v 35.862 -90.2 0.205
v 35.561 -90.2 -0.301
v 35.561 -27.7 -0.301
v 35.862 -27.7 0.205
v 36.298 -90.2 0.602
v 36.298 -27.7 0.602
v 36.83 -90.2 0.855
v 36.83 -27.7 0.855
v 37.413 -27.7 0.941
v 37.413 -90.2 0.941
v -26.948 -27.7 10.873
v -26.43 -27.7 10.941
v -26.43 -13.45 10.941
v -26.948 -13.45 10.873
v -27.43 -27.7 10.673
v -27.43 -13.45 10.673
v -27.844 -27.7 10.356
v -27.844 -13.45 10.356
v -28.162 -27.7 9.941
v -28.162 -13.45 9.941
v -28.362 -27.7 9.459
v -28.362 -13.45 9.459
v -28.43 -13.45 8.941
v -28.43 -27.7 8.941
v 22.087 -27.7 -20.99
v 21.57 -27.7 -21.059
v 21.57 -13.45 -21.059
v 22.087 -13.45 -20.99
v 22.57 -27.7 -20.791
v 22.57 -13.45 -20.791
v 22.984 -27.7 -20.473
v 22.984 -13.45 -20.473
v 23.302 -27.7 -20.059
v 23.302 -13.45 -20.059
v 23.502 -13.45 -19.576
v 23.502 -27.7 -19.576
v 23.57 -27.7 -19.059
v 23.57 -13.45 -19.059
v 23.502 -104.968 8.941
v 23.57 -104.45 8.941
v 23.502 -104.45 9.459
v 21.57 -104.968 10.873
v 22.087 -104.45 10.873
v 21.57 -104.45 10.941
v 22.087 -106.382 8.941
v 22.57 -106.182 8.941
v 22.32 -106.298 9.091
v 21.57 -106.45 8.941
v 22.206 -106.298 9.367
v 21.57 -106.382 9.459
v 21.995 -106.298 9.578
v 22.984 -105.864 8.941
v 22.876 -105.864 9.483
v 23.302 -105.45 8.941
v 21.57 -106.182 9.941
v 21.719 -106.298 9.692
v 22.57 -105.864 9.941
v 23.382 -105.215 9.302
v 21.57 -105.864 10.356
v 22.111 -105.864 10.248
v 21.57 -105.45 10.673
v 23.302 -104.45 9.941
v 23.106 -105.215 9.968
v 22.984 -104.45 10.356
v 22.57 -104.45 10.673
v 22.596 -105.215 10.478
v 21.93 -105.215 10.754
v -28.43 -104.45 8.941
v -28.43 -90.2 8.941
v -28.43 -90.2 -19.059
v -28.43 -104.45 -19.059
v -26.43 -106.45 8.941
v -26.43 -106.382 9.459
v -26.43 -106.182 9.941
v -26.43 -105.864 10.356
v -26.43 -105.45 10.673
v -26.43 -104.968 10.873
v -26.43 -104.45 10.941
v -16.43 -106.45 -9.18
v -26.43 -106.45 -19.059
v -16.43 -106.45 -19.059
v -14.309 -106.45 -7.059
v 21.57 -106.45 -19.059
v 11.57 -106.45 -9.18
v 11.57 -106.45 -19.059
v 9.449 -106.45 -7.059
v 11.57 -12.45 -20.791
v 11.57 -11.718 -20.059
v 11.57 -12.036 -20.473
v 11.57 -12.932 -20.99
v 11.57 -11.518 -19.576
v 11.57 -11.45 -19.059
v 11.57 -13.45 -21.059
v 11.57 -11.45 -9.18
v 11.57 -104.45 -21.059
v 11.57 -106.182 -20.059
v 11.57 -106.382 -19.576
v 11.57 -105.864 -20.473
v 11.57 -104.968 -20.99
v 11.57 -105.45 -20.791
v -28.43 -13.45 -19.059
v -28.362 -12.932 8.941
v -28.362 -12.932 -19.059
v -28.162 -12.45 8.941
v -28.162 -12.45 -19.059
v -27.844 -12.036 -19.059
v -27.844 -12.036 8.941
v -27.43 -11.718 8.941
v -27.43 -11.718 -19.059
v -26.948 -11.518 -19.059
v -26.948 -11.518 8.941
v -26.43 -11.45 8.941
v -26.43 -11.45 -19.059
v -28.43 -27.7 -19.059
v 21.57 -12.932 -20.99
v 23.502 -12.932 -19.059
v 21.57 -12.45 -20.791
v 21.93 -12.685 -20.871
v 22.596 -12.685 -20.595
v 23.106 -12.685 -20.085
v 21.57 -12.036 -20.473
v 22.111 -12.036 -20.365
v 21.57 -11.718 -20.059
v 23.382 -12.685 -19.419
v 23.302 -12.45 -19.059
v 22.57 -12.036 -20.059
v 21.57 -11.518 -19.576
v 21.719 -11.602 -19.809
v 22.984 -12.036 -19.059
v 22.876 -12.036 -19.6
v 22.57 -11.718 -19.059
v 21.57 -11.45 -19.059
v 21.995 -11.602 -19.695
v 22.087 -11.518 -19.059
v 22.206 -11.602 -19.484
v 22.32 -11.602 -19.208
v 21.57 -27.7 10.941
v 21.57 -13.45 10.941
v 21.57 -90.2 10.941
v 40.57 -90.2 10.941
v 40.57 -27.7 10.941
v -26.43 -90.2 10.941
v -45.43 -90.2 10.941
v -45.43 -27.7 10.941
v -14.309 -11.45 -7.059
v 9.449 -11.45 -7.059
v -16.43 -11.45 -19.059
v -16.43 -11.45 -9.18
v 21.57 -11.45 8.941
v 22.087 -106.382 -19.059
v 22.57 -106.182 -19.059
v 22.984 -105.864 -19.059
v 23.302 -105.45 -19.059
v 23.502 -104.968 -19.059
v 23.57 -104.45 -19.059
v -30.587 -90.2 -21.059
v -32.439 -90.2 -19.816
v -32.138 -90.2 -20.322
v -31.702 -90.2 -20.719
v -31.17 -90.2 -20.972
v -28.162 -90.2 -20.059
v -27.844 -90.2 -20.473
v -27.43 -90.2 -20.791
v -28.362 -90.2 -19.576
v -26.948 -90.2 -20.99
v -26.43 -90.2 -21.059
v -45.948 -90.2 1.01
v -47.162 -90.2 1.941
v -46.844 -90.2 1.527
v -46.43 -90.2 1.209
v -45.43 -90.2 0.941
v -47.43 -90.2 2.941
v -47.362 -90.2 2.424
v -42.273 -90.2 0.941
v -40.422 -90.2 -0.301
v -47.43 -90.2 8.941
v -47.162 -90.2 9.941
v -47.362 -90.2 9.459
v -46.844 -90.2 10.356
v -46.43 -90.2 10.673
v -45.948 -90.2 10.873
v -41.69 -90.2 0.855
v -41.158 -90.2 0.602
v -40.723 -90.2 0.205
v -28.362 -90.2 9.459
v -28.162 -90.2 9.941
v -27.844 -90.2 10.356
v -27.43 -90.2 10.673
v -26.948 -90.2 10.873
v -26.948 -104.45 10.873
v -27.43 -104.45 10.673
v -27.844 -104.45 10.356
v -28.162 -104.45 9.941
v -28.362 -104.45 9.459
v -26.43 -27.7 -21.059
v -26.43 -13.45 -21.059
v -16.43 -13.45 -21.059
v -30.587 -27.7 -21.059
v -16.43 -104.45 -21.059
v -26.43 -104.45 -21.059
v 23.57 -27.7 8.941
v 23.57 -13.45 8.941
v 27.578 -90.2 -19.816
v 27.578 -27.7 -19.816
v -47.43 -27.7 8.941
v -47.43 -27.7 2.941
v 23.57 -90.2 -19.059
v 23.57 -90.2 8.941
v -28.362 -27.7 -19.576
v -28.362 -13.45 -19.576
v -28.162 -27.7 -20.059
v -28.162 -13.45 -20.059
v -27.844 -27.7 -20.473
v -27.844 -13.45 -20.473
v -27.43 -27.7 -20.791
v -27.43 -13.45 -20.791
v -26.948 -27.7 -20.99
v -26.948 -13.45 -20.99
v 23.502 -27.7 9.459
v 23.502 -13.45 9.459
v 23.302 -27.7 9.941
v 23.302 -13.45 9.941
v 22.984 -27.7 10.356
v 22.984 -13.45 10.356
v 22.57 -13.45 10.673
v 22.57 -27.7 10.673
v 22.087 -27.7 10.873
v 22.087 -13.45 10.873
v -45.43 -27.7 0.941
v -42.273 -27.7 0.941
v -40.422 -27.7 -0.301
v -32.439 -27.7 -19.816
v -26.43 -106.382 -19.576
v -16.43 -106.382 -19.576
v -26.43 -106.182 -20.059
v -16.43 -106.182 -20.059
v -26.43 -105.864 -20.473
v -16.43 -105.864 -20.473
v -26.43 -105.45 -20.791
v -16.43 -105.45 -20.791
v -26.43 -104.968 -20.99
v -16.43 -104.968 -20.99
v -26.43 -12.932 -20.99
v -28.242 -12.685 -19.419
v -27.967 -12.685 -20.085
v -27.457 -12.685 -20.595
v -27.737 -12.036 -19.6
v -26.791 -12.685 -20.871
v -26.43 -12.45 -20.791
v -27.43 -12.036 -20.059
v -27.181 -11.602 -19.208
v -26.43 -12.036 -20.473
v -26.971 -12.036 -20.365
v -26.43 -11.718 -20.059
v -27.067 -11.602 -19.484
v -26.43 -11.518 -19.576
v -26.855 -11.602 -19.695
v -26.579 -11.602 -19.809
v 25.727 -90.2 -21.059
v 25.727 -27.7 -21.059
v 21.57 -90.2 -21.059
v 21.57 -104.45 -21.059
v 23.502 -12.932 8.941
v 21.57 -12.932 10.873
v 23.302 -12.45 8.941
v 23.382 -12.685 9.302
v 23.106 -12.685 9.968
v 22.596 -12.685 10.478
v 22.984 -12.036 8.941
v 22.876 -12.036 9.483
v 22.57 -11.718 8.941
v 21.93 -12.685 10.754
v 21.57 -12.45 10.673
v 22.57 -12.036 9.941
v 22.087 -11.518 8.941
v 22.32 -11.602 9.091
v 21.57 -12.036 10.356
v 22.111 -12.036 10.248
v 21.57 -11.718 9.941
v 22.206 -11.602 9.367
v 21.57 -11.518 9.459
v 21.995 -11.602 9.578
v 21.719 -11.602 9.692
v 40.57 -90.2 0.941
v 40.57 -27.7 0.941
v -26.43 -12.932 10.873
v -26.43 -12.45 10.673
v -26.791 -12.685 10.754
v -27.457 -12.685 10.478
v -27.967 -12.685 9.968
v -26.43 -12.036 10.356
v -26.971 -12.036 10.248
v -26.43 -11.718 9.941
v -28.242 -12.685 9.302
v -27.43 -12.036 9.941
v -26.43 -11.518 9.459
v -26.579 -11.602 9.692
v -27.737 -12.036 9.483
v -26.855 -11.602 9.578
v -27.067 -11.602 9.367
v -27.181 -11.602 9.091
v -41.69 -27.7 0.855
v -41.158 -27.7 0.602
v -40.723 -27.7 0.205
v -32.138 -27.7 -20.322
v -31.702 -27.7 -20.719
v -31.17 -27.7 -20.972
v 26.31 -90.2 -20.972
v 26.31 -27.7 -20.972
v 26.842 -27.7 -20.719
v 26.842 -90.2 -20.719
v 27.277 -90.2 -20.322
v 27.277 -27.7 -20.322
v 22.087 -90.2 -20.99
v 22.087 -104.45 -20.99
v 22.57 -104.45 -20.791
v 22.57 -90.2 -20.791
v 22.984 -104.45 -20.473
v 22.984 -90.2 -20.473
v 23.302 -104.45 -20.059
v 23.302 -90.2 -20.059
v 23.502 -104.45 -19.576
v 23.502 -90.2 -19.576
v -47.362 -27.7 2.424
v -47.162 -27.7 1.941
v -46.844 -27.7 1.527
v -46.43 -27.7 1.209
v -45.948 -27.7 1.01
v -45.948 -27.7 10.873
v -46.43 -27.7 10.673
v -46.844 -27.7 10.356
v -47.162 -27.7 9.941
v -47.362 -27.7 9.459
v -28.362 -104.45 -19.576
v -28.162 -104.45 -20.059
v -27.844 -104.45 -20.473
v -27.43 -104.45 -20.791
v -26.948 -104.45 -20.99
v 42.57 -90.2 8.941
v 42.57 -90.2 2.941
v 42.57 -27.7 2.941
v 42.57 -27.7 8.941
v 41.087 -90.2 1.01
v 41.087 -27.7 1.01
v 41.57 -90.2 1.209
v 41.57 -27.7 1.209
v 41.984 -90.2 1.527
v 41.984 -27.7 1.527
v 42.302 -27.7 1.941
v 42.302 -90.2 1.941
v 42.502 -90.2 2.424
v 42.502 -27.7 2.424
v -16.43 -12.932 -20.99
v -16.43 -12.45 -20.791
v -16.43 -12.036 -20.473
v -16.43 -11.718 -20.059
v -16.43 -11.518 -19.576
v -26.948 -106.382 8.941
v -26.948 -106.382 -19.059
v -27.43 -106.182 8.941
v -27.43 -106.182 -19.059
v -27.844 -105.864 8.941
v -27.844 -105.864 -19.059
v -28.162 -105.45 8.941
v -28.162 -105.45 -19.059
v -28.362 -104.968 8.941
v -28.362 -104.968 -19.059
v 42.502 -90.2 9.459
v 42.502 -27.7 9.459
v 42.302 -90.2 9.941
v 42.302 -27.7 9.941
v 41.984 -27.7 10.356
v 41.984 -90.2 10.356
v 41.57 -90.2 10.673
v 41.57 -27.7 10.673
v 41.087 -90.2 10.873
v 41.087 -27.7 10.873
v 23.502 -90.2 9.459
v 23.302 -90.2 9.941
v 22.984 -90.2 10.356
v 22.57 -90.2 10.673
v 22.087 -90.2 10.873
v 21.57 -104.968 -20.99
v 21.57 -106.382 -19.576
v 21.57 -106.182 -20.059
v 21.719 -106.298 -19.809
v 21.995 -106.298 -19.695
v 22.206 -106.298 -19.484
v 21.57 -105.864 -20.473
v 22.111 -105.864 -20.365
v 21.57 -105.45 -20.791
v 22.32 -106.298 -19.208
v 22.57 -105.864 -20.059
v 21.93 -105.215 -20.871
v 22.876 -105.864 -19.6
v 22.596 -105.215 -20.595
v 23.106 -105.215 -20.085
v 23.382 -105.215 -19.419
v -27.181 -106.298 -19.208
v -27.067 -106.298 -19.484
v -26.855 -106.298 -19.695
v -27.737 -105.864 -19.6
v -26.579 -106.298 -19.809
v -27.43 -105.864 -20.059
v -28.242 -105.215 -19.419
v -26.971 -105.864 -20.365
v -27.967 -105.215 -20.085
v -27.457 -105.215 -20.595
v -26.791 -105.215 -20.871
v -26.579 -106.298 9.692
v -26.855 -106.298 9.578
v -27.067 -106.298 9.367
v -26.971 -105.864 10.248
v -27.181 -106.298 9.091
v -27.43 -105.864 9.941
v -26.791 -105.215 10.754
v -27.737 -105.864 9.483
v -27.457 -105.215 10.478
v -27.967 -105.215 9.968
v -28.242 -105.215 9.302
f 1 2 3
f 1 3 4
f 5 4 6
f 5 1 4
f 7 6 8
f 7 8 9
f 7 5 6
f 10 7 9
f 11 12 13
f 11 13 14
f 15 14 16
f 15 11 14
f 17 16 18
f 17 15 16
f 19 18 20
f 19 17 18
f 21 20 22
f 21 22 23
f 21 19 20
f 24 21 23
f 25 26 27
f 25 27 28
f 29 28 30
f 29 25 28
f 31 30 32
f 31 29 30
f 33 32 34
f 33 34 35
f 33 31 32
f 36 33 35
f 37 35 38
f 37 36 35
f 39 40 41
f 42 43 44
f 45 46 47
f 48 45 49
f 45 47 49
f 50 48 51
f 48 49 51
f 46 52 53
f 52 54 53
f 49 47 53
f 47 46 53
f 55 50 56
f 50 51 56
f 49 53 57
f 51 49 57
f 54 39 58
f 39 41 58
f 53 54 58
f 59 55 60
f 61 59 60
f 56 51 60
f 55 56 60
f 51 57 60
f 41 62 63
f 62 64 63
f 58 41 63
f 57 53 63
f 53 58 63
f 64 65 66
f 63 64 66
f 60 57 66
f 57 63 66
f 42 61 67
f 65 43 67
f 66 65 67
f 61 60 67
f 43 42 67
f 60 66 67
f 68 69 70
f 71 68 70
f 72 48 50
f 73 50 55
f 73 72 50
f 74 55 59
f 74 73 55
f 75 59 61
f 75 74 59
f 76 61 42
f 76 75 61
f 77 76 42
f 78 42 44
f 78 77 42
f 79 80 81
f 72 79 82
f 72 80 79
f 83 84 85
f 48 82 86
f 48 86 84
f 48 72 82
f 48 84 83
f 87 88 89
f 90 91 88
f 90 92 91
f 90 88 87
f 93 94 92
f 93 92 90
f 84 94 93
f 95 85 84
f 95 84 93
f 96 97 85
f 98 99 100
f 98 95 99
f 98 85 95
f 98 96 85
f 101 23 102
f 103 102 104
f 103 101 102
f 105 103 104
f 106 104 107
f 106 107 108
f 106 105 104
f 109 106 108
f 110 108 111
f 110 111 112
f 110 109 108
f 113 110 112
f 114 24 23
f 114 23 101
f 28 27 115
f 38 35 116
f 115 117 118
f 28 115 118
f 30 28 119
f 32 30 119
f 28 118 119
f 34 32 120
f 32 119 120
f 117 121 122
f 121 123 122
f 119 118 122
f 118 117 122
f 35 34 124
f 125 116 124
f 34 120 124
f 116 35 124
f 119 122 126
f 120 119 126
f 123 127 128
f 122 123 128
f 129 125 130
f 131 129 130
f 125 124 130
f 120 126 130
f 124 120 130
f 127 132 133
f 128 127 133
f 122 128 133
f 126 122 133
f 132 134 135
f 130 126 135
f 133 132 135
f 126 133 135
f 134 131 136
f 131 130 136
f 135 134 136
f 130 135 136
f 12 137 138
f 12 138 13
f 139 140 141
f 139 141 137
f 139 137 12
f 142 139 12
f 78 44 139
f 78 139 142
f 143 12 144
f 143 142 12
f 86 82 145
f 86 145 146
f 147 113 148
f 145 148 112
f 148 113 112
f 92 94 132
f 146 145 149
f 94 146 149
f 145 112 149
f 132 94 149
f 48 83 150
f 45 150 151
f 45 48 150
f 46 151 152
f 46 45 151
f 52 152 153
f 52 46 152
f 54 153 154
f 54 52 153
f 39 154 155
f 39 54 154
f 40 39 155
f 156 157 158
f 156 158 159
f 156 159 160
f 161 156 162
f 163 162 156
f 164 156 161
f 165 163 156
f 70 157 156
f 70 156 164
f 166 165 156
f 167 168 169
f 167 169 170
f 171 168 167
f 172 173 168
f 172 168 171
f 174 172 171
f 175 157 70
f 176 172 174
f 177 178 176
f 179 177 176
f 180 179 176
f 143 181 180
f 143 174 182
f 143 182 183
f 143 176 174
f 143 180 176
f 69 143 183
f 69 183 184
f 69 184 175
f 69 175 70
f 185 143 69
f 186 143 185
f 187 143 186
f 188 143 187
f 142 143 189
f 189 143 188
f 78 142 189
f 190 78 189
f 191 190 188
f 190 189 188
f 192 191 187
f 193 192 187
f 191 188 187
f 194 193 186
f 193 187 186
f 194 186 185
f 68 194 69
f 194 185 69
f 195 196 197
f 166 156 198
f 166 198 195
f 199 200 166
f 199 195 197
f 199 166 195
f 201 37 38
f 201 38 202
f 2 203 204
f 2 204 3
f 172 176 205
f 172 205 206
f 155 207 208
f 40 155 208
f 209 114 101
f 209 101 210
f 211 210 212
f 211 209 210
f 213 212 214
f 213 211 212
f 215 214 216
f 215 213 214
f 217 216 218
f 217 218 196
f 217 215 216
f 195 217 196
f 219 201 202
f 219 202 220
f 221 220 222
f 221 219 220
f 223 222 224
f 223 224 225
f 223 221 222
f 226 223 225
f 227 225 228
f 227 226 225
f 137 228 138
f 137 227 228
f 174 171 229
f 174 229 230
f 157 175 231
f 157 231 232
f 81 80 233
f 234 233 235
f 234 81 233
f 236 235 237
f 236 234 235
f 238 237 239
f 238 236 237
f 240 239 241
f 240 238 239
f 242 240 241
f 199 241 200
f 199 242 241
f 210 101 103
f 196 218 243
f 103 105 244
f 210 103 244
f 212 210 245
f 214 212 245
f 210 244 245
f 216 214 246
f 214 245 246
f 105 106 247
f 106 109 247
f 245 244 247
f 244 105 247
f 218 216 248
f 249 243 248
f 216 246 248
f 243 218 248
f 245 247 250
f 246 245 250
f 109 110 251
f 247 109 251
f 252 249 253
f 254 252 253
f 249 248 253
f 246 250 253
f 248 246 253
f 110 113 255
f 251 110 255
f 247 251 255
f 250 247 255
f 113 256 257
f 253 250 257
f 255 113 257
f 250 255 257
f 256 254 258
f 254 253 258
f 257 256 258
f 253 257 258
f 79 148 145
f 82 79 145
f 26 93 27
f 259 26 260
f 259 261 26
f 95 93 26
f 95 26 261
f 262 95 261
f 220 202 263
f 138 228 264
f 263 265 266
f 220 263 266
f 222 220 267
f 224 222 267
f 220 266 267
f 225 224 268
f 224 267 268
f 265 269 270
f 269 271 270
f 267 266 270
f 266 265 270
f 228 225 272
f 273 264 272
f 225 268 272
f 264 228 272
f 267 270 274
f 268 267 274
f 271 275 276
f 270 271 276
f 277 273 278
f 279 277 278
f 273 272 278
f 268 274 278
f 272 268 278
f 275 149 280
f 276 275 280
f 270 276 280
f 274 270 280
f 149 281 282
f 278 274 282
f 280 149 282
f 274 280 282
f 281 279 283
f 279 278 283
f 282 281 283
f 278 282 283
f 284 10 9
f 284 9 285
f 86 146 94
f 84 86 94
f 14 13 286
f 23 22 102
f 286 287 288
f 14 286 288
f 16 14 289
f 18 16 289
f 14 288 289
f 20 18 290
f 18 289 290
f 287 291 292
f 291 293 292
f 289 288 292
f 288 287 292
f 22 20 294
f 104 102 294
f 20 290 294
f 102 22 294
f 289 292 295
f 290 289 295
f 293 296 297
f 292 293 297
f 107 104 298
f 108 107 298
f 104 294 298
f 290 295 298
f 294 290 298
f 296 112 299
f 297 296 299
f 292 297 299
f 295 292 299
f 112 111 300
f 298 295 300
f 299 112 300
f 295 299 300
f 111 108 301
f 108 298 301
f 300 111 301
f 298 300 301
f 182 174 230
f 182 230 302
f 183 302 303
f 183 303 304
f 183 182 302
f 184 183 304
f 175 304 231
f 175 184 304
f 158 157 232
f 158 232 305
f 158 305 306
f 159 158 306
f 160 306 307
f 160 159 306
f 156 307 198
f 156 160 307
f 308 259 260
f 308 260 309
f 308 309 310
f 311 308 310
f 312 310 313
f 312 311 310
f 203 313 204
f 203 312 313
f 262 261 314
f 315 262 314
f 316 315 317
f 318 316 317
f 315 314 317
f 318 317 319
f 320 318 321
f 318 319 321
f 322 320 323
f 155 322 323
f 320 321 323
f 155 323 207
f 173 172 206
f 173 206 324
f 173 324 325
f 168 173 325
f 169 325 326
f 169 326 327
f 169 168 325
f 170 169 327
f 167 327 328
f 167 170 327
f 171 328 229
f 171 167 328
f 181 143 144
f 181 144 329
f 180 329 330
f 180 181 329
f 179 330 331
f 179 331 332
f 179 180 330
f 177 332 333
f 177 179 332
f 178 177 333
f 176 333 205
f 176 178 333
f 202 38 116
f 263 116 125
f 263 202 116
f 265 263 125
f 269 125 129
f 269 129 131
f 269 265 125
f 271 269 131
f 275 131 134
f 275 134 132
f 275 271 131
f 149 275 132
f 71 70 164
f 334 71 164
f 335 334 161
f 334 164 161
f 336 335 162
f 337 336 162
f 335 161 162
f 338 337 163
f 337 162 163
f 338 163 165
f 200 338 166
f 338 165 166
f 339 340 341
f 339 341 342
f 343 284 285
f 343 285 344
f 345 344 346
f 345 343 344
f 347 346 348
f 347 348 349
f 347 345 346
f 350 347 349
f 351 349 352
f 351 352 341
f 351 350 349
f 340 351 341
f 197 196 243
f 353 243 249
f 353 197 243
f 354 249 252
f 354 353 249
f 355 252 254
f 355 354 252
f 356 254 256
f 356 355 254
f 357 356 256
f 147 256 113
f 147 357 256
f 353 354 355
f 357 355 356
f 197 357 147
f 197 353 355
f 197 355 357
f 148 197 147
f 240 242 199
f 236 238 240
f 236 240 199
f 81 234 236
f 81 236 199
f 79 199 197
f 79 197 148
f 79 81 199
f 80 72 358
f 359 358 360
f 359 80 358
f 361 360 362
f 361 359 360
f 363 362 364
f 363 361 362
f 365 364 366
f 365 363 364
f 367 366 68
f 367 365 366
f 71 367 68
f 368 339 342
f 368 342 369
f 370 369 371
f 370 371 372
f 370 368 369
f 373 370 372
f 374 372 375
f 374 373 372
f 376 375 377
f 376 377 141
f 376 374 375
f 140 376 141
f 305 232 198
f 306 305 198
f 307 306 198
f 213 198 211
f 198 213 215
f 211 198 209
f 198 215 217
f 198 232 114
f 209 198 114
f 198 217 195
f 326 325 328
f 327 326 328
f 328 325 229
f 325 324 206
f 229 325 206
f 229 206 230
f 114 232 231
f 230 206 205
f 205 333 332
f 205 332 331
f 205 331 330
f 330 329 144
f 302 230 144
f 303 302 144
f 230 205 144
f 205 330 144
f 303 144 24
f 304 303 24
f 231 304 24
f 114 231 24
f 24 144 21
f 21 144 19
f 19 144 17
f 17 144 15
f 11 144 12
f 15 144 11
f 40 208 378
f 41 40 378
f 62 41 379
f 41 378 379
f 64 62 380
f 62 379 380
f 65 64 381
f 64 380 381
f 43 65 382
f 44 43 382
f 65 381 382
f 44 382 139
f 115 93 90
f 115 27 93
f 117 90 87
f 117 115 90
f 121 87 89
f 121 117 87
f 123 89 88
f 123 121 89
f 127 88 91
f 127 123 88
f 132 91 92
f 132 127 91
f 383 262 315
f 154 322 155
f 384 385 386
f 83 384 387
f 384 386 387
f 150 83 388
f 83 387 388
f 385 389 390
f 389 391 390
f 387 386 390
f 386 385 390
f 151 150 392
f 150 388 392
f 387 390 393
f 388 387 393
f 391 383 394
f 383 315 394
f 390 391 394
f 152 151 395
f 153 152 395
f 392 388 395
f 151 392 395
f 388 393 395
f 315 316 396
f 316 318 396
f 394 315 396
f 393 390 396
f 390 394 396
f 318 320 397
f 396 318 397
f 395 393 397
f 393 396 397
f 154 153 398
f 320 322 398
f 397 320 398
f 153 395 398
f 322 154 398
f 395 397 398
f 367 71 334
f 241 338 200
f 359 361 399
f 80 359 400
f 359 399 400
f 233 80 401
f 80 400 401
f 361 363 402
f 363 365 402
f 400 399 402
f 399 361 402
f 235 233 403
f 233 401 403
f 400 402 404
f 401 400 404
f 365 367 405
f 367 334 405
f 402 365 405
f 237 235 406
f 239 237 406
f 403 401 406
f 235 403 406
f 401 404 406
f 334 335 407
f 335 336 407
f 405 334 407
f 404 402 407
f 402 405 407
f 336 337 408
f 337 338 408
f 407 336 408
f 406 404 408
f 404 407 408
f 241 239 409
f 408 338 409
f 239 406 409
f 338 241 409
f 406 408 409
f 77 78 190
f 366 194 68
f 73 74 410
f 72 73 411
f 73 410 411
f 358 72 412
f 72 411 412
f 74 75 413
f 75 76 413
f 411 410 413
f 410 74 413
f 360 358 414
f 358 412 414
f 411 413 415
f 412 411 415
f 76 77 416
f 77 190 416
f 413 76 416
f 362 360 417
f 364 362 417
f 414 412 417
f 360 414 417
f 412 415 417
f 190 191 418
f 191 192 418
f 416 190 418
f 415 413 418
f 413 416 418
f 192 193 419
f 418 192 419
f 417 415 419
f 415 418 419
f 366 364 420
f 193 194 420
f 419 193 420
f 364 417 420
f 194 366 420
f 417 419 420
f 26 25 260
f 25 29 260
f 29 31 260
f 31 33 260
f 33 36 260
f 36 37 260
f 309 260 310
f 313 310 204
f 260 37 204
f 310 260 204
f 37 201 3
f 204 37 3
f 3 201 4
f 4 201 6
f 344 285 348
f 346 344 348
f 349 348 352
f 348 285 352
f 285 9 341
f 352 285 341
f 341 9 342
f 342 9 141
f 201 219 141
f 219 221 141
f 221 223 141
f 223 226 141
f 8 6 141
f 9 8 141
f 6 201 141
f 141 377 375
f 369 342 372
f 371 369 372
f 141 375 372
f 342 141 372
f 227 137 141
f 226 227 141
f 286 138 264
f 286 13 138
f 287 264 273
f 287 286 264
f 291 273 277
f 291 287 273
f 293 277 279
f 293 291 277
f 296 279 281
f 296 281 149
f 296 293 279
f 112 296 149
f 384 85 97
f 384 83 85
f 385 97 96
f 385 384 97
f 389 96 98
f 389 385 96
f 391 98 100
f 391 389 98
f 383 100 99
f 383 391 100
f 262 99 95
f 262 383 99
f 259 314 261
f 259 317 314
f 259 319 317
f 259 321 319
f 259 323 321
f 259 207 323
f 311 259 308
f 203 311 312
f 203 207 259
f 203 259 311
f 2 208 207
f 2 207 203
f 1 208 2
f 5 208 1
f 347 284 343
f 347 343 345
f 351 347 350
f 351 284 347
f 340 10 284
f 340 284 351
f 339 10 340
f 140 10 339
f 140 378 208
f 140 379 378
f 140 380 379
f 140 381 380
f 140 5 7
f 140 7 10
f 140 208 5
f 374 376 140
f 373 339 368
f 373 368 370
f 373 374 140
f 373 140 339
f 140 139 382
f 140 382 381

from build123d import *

# Parameters (mm, degrees)
F0_W          = 90
F0_H          = 32
F1_DEPTH      = 65.2
F3_DEPTH      = 25
F4_W          = 90
F4_H          = 65.2
F5_DEPTH      = 32.001
F6_DEPTH      = 62.5
F8_DEPTH      = 16.25
F8_DEPTH_BACK = 78.75
F9_R          = 2
F11_DEPTH     = 78.751


with BuildPart() as f1:
    # F0 (on Front) → F1 (new body)
    with BuildSketch(Plane.XZ):
        with Locations((-2.4301670492, -5.0586230417)):
            Rectangle(F0_W, F0_H)
    extrude(amount=F1_DEPTH)

    # F2 (on face) → F3 (join)
    with BuildSketch(Plane.XZ.offset(65.2)):
        with BuildLine():
            Line((40.5698329508, 10.9413769583), (-45.4301670492, 10.9413769583))
            ThreePointArc((-45.4301670492, 10.9413769583), (-46.8443806115, 10.3555905207), (-47.4301670492, 8.9413769583))
            Line((-47.4301670492, 8.9413769583), (-47.4301670492, 2.9413769583))
            ThreePointArc((-47.4301670492, 2.9413769583), (-46.8443806115, 1.5271633959), (-45.4301670492, 0.9413769583))
            Line((-45.4301670492, 0.9413769583), (-42.2728696535, 0.9413769583))
            ThreePointArc((-42.2728696535, 0.9413769583), (-41.1580897163, 0.6018785968), (-40.4217757411, -0.3013573503))
            Line((-40.4217757411, -0.3013573503), (-32.4385583572, -19.8158887331))
            ThreePointArc((-32.4385583572, -19.8158887331), (-31.7022443821, -20.7191246802), (-30.5874644448, -21.0586230417))
            Line((-30.5874644448, -21.0586230417), (25.7271303465, -21.0586230417))
            ThreePointArc((25.7271303465, -21.0586230417), (26.8419102837, -20.7191246802), (27.5782242589, -19.8158887331))
            Line((27.5782242589, -19.8158887331), (35.5614416428, -0.3013573503))
            ThreePointArc((35.5614416428, -0.3013573503), (36.2977556179, 0.6018785968), (37.4125355552, 0.9413769583))
            Line((37.4125355552, 0.9413769583), (40.5698329508, 0.9413769583))
            ThreePointArc((40.5698329508, 0.9413769583), (41.9840465132, 1.5271633959), (42.5698329508, 2.9413769583))
            Line((42.5698329508, 2.9413769583), (42.5698329508, 8.9413769583))
            ThreePointArc((42.5698329508, 8.9413769583), (41.9840465132, 10.3555905207), (40.5698329508, 10.9413769583))
        make_face()
    extrude(amount=F3_DEPTH)

    # F4 (on face) → F5 (cut, through all)
    with BuildSketch(Plane.XY.offset(10.9413769583)):
        with Locations((-2.4301670492, -32.6)):
            Rectangle(F4_W, F4_H)
    extrude(amount=-F5_DEPTH, mode=Mode.SUBTRACT)

    # F6 (add): a face of the model
    f6_faces = [f1.faces().sort_by_distance(p)[0] for p in [
        (-2.4301670492, -90.2, -3.7537517767),
    ]]
    extrude(f6_faces, amount=-F6_DEPTH)

    # F7 (on face) → F8 (join, two sides)
    with BuildSketch(Plane.XZ.offset(90.2)) as f8_sk:
        with BuildLine():
            Line((21.5698329508, 10.9413769583), (-26.4301670492, 10.9413769583))
            ThreePointArc((-26.4301670492, 10.9413769583), (-27.8443806115, 10.3555905207), (-28.4301670492, 8.9413769583))
            Line((-28.4301670492, 8.9413769583), (-28.4301670492, -19.0586230417))
            ThreePointArc((-28.4301670492, -19.0586230417), (-27.8443806115, -20.4728366041), (-26.4301670492, -21.0586230417))
            Line((-26.4301670492, -21.0586230417), (-16.4301670492, -21.0586230417))
            Line((-16.4301670492, -21.0586230417), (-16.4301670492, -9.1799433853))
            Line((-16.4301670492, -9.1799433853), (-14.3088467056, -7.0586230417))
            Line((-14.3088467056, -7.0586230417), (9.4485126073, -7.0586230417))
            Line((9.4485126073, -7.0586230417), (11.5698329508, -9.1799433853))
            Line((11.5698329508, -9.1799433853), (11.5698329508, -21.0586230417))
            Line((11.5698329508, -21.0586230417), (21.5698329508, -21.0586230417))
            ThreePointArc((21.5698329508, -21.0586230417), (22.9840465132, -20.4728366041), (23.5698329508, -19.0586230417))
            Line((23.5698329508, -19.0586230417), (23.5698329508, 8.9413769583))
            ThreePointArc((23.5698329508, 8.9413769583), (22.9840465132, 10.3555905207), (21.5698329508, 10.9413769583))
        make_face()
    extrude(amount=F8_DEPTH)
    extrude(f8_sk.sketch, amount=-F8_DEPTH_BACK)

    # F9
    f9_edges = [f1.edges().sort_by_distance(p)[0] for p in [
        (-28.430167, -106.45, -5.058623),
        (-2.430167, -11.45, 10.941377),
    ]]
    fillet(f9_edges, radius=F9_R)

    # F10 (on face) → F11 (cut, through all)
    with BuildSketch(Plane.XZ.offset(90.2)):
        Polygon((-16.4301670492, -9.1799433853), (-16.4301670492, -21.0586230417), (11.5698329508, -21.0586230417), (11.5698329508, -9.1799433853), (9.4485126073, -7.0586230417), (-14.3088467056, -7.0586230417), align=None)
    extrude(amount=-F11_DEPTH, mode=Mode.SUBTRACT)


solid = f1.part
